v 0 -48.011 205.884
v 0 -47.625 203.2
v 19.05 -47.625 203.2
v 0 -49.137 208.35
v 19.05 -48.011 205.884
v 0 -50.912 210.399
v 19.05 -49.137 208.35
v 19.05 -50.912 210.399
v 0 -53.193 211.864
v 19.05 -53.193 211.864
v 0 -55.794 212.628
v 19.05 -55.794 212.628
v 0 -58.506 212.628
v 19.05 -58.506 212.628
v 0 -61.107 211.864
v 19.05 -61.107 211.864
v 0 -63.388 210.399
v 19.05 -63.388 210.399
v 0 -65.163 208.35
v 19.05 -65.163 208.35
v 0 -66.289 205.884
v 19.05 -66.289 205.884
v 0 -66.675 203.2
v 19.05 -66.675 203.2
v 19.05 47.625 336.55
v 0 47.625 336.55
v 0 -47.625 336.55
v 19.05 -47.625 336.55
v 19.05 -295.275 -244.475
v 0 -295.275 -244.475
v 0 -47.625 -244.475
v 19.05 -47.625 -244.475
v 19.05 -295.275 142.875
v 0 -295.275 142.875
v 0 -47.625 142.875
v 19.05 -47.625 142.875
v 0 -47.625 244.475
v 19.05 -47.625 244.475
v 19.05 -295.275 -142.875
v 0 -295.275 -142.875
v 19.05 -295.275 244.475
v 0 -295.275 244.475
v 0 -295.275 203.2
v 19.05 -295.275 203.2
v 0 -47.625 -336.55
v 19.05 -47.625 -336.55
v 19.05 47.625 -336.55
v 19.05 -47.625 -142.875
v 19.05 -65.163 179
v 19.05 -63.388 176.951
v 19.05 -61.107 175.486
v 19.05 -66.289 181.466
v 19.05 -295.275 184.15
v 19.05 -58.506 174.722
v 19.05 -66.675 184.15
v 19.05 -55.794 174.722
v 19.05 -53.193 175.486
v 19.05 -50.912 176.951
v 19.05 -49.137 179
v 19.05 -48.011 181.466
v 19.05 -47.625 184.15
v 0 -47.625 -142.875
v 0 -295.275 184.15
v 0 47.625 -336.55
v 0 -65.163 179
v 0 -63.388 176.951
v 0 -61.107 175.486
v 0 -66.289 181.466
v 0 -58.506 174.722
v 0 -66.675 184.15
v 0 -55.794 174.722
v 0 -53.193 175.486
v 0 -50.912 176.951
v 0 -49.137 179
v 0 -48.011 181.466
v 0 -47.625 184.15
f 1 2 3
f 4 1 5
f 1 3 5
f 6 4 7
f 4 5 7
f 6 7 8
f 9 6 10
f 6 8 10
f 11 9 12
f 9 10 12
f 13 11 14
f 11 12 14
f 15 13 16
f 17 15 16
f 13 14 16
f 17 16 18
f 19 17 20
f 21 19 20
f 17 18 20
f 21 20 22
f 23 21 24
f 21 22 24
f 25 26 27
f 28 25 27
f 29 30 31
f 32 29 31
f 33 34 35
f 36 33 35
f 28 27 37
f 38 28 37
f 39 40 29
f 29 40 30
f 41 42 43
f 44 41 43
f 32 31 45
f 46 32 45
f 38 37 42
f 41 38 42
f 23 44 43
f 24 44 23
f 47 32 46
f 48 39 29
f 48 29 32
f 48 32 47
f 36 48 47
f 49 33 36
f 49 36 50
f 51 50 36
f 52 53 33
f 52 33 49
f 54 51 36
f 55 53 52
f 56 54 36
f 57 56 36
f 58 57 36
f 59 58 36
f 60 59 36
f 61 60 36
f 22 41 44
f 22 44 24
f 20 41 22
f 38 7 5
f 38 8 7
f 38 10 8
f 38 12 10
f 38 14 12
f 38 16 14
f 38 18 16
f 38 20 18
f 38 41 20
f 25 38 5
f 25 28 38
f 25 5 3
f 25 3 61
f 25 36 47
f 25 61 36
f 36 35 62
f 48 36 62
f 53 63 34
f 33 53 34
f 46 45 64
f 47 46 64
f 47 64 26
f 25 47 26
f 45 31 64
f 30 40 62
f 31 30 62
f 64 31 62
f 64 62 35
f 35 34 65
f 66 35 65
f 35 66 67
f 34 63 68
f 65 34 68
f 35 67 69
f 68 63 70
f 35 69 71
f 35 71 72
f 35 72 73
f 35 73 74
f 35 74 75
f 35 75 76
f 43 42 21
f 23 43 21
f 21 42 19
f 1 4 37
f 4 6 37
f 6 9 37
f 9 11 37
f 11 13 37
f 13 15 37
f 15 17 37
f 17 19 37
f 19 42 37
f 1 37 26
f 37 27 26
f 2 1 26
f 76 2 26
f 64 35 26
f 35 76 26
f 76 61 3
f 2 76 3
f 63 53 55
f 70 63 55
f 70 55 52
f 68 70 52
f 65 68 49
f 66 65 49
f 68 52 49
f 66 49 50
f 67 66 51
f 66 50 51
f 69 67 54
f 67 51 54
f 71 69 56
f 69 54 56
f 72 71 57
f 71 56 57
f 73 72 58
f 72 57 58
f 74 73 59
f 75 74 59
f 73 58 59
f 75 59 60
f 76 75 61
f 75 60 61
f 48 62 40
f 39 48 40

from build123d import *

# Parameters (mm, degrees)
F2_DEPTH = 19.05
F3_W     = 247.65
F3_H     = 19.05
F4_DEPTH = 25.4
F6_DEPTH = 25.4


# Not quite as in the source:
# - a variable given as a bare number and used for a length is read in inches; the dataset says mm whatever the document's units were


with BuildPart() as f2:
    # F1 (on Right) → F2 (new body)
    with BuildSketch(Plane.YZ):
        Polygon((-47.625, 142.875), (-47.625, 0), (-47.625, -142.875), (-295.275, -142.875), (-295.275, -244.475), (-47.625, -244.475), (-47.625, -336.55), (47.625, -336.55), (47.625, 0), (47.625, 336.55), (-47.625, 336.55), (-47.625, 244.475), (-295.275, 244.475), (-295.275, 142.875), align=None)
    extrude(amount=F2_DEPTH)

    # F3 (on face) → F4 (cut)
    with BuildSketch(Plane.YZ.offset(19.05)):
        with Locations((-171.45, 193.675)):
            Rectangle(F3_W, F3_H)
    extrude(amount=-F4_DEPTH, mode=Mode.SUBTRACT)

    # F5 (on face) → F6 (cut)
    with BuildSketch(Plane.YZ.offset(19.05)):
        with BuildLine():
            Line((-47.625, 184.15), (-47.625, 203.2))
            ThreePointArc((-47.625, 203.2), (-57.15, 212.725), (-66.675, 203.2))
            Line((-66.675, 203.2), (-66.675, 184.15))
            ThreePointArc((-66.675, 184.15), (-57.15, 174.625), (-47.625, 184.15))
        make_face()
    extrude(amount=-F6_DEPTH, mode=Mode.SUBTRACT)


solid = f2.part
